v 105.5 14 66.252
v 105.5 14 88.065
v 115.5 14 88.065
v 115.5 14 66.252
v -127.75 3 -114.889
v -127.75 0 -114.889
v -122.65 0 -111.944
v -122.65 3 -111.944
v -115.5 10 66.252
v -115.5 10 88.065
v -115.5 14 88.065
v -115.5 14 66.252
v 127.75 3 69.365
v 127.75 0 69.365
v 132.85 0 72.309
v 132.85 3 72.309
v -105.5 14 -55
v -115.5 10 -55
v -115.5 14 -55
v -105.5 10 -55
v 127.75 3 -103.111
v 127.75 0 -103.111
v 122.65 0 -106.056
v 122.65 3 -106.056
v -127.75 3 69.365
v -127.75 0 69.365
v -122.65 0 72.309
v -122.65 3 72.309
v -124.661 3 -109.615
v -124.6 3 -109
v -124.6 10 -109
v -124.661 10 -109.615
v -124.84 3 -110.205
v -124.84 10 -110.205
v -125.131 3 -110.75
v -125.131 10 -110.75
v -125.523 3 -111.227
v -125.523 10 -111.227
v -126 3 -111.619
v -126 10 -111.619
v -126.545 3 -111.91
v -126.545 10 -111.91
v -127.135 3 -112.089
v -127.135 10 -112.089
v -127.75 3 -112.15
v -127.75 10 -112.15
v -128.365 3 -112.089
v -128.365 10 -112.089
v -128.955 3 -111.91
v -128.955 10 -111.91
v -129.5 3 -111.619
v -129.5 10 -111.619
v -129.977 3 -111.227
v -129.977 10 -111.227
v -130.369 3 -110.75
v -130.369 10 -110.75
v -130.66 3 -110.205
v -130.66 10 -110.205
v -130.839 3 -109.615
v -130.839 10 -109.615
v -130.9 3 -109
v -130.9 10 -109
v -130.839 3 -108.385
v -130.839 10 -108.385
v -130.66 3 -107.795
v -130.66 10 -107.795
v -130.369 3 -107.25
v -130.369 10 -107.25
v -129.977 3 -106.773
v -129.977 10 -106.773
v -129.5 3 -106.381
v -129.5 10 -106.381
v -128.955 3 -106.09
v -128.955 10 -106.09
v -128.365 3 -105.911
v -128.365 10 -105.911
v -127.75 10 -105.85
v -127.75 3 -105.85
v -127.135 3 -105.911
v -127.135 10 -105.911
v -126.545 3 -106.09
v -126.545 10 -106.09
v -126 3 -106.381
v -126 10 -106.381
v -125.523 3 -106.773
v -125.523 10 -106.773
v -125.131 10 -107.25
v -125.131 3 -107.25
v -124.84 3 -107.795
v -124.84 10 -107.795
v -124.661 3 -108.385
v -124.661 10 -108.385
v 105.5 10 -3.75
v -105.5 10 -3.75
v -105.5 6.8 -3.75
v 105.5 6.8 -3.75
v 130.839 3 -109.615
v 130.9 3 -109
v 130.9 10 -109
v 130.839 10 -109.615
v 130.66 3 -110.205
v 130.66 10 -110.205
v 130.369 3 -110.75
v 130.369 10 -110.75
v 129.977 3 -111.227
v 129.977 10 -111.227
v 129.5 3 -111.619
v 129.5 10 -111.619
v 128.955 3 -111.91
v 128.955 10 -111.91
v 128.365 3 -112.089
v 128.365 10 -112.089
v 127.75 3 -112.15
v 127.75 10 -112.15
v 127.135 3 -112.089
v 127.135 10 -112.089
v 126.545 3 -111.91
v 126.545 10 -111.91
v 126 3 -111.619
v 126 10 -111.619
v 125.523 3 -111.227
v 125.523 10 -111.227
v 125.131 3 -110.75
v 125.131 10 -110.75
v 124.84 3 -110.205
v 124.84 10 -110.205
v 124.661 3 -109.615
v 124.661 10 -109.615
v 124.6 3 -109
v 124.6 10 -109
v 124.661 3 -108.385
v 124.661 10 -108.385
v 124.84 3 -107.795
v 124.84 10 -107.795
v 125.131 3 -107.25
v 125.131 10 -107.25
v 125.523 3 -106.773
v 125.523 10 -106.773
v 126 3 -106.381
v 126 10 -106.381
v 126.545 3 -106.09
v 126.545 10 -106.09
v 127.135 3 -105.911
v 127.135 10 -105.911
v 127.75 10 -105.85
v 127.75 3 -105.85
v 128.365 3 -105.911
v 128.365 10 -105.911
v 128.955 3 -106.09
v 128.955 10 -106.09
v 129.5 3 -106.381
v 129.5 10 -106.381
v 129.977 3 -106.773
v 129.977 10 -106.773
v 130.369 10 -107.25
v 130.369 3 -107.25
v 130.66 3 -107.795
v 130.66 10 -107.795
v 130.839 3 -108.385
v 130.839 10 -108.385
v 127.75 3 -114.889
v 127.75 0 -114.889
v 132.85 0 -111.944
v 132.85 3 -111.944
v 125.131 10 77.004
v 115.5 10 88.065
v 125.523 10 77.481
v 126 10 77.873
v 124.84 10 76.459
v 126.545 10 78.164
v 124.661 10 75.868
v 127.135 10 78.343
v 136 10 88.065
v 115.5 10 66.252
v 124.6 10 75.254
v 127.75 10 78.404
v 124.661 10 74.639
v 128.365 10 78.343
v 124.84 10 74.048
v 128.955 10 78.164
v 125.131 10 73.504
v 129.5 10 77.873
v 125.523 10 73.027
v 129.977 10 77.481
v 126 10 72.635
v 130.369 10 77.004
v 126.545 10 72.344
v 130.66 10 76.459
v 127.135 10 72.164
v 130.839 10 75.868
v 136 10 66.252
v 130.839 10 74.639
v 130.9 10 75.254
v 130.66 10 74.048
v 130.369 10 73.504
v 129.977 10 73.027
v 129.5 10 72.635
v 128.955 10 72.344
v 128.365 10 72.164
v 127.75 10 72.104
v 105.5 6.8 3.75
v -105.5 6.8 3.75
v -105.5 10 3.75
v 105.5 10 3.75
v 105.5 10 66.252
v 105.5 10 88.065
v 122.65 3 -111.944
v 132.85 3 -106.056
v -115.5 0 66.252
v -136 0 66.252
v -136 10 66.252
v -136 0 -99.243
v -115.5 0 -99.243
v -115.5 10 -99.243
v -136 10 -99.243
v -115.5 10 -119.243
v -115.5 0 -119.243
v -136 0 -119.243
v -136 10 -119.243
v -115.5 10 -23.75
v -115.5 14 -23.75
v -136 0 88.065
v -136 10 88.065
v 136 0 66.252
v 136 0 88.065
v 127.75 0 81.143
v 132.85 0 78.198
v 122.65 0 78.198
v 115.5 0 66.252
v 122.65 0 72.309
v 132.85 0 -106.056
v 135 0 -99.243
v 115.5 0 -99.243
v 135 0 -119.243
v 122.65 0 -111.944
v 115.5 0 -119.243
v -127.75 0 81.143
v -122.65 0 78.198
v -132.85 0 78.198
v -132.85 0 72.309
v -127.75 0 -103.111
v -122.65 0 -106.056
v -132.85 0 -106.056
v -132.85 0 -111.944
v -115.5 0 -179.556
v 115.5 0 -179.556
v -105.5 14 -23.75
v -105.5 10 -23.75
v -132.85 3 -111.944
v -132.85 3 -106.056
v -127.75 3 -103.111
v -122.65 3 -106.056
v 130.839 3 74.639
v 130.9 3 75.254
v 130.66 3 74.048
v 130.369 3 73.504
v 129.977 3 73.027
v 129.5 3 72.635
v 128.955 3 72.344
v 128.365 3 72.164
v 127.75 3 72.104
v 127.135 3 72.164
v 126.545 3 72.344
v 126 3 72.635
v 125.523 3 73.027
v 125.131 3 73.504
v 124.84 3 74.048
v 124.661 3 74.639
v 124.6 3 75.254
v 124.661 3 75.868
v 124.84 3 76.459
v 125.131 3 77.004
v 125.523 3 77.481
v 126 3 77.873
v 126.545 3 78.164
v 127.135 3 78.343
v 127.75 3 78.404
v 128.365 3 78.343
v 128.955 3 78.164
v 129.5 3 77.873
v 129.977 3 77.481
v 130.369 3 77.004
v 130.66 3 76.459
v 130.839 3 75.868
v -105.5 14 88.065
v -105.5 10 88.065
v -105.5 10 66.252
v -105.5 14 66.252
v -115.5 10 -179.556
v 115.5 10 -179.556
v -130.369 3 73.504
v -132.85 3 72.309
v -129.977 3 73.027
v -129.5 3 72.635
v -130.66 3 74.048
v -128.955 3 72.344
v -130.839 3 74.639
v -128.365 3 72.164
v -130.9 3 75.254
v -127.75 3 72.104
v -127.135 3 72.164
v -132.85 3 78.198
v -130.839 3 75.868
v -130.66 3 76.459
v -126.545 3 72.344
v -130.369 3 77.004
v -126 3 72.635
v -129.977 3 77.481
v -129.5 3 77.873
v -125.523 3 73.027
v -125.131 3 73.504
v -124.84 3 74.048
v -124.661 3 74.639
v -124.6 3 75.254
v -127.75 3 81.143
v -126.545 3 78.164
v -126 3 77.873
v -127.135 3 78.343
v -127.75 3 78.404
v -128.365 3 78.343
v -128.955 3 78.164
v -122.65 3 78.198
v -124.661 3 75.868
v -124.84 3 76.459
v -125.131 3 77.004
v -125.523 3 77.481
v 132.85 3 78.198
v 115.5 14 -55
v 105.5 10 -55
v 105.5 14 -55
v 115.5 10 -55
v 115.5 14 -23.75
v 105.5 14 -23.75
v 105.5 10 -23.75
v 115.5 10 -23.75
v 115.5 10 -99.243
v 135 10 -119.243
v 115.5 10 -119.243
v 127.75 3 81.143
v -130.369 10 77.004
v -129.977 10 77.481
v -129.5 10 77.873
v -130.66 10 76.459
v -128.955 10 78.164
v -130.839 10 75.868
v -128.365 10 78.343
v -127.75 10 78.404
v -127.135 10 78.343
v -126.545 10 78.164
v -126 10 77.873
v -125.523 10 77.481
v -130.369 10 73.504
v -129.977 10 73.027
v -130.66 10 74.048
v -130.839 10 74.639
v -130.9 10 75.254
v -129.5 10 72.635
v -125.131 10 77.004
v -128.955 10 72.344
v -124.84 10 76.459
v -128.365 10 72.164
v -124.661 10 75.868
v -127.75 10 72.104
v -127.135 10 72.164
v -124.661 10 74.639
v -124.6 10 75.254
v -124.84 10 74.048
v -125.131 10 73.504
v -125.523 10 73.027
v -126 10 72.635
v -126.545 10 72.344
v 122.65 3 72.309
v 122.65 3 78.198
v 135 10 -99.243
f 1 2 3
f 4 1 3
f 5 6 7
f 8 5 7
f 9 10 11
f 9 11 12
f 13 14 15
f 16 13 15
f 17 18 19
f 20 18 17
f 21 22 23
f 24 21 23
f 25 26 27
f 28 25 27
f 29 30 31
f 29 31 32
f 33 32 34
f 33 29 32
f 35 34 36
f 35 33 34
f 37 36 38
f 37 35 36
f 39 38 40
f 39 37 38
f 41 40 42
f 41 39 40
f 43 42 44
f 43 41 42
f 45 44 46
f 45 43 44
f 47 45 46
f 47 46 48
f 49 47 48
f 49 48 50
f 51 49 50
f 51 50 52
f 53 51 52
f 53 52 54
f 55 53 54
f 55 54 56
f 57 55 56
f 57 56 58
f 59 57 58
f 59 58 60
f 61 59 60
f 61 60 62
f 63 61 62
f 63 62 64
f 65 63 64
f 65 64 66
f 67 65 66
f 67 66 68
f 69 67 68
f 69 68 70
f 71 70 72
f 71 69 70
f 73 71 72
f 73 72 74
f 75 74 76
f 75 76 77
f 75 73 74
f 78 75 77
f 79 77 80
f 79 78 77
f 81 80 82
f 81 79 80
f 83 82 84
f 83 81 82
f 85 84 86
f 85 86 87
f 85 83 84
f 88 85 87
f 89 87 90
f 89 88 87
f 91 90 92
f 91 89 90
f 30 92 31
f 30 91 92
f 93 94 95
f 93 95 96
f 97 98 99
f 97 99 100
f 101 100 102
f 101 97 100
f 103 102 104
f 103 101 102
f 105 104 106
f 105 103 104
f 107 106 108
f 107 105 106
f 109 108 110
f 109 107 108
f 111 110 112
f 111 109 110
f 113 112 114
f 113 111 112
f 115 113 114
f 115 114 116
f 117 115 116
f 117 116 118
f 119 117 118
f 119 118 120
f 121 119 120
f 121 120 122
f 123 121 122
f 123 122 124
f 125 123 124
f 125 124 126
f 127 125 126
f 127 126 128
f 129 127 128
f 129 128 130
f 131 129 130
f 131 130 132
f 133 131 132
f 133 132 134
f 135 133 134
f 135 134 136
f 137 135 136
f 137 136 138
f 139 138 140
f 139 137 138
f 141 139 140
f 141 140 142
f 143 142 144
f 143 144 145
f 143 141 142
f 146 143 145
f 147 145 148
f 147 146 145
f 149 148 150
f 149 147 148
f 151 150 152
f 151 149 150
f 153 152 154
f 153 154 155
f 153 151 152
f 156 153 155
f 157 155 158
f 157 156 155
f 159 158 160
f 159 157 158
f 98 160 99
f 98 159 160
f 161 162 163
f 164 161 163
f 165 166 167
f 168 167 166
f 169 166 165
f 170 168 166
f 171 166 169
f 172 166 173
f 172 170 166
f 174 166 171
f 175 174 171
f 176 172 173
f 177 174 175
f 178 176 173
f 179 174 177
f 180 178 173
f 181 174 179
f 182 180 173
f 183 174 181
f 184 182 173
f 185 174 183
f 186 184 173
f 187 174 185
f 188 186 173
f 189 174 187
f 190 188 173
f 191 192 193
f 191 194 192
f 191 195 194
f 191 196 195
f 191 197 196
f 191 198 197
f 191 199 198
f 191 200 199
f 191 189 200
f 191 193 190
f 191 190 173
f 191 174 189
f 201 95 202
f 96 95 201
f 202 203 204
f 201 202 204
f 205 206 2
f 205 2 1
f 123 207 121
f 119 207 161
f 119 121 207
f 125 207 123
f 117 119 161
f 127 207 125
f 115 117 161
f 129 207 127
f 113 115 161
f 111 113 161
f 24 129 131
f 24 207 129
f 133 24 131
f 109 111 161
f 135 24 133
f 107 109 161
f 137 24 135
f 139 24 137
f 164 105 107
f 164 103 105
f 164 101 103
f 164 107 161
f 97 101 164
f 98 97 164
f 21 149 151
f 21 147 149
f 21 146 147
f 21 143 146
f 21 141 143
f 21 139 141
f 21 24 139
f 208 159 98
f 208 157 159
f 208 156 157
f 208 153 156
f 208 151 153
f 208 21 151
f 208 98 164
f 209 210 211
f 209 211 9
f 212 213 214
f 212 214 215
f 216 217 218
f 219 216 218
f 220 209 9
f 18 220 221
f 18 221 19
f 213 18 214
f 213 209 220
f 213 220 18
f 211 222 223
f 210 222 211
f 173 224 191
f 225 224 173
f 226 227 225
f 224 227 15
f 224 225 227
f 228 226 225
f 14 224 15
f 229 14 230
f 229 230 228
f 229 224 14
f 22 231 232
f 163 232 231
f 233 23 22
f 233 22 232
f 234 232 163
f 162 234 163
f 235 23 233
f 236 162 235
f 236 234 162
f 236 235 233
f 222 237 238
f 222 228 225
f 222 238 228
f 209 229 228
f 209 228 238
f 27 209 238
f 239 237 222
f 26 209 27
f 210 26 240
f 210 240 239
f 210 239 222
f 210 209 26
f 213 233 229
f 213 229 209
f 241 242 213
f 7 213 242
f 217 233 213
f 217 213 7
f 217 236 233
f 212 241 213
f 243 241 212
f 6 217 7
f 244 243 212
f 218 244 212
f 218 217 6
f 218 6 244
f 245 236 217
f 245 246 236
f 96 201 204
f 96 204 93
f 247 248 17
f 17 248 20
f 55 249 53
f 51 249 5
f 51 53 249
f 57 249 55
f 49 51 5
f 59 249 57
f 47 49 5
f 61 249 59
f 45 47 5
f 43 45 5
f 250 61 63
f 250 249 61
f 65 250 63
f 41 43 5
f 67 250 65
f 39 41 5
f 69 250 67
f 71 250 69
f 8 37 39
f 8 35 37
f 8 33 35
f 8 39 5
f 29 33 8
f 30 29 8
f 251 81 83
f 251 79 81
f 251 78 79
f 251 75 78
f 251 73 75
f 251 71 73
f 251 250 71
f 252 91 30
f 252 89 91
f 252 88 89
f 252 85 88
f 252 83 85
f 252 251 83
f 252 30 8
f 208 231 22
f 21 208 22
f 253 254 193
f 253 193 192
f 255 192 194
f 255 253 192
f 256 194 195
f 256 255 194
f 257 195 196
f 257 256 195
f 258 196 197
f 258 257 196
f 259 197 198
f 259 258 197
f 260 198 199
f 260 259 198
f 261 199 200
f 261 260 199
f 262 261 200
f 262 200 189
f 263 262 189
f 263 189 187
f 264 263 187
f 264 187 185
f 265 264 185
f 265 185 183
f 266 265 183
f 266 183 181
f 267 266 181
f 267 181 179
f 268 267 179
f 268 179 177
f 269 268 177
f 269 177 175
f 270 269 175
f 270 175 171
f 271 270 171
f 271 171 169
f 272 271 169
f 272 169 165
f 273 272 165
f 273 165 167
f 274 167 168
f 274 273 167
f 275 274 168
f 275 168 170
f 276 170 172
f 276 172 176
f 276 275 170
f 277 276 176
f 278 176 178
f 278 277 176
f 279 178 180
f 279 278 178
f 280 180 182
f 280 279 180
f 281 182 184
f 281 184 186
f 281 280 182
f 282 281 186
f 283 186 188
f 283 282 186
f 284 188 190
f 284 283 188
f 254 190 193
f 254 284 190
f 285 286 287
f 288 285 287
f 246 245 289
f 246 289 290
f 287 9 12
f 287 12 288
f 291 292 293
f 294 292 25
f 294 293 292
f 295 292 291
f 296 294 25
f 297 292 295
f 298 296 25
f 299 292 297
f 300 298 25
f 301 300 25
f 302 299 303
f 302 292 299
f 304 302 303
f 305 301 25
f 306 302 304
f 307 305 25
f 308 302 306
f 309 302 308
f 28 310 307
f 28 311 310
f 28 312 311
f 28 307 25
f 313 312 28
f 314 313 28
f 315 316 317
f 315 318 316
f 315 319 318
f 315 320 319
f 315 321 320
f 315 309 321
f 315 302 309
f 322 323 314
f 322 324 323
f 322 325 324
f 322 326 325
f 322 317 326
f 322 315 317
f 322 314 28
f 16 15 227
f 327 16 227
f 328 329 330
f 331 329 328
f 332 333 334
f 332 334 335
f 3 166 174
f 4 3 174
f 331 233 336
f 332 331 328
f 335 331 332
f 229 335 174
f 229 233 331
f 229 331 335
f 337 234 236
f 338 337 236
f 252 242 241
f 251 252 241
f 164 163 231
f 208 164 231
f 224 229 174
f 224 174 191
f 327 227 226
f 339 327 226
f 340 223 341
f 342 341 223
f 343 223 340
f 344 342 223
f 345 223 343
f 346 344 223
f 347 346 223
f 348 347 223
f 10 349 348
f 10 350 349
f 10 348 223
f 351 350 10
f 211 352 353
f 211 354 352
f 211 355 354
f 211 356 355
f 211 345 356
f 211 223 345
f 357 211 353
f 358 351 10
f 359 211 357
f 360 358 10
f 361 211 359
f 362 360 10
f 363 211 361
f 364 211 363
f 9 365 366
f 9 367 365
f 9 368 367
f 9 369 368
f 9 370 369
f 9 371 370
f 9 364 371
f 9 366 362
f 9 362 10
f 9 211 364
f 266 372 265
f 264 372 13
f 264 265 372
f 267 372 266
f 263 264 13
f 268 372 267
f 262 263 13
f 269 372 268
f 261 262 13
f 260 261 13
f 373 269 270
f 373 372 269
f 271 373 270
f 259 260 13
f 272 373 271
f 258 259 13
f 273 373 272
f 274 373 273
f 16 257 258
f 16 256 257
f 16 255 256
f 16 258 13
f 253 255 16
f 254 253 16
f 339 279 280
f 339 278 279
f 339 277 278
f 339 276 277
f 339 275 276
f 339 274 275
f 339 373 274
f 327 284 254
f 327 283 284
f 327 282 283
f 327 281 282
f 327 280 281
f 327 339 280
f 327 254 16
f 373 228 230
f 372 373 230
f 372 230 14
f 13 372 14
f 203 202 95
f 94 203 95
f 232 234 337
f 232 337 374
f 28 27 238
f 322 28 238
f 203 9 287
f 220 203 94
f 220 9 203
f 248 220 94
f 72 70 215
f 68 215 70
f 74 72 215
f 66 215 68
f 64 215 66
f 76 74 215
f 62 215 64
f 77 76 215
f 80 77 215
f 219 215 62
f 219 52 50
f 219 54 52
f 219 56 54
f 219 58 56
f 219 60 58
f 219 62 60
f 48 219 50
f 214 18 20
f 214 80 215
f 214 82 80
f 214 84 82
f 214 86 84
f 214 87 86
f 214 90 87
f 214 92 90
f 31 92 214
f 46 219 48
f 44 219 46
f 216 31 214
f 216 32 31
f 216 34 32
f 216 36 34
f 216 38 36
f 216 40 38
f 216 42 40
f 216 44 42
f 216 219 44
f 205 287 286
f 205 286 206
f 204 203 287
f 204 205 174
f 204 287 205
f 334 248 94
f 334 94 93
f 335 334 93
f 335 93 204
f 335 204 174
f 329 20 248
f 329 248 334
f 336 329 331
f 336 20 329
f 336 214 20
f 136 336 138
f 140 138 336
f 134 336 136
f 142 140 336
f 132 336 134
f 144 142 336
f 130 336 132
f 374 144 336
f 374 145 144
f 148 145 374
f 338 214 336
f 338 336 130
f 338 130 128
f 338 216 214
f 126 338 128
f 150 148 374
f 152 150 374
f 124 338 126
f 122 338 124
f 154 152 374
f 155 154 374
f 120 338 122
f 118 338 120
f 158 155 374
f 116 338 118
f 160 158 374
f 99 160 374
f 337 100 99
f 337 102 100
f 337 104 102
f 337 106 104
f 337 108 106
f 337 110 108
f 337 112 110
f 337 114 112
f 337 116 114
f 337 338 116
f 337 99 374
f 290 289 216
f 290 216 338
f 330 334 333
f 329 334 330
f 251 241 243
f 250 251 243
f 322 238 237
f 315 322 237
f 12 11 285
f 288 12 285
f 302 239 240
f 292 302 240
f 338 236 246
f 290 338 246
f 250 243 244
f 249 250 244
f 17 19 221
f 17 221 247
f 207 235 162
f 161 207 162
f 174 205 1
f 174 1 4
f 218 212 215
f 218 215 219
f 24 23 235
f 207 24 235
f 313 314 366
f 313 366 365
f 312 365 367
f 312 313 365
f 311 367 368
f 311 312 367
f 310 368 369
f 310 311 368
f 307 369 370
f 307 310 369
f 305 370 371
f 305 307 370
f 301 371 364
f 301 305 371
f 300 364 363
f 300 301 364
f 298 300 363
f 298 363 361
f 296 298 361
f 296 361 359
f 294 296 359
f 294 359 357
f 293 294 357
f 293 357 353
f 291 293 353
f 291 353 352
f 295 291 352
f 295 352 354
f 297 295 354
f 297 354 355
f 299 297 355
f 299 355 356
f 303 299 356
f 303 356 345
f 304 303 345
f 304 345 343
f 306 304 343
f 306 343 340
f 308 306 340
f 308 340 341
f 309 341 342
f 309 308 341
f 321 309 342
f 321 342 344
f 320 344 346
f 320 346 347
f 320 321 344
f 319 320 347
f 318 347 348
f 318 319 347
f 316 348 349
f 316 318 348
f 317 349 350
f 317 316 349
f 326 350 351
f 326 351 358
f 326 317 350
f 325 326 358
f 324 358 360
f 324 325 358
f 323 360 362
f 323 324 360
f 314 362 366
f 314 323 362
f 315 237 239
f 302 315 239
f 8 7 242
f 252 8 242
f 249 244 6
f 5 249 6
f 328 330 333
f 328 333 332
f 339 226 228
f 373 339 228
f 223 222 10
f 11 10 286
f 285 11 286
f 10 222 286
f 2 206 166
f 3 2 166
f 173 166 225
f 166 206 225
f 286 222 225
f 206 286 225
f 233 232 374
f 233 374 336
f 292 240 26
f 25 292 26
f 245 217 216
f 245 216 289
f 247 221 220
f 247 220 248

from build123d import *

# Parameters (mm, degrees)
SKETCH1_W           = 211
SKETCH1_H           = 110
BOSS_EXTRUDE1_DEPTH = 10
SKETCH1_3_W         = 10
SKETCH1_3_H         = 110
BOSS_EXTRUDE2_DEPTH = 14
SKETCH5_W           = 211
SKETCH5_H           = 7.5
CUT_EXTRUDE5_DEPTH  = 3.2
SKETCH6_R           = 3.15
BOSS_EXTRUDE3_DEPTH = 10
CUT_EXTRUDE9_DEPTH  = 2
SKETCH11_W          = 10
SKETCH11_H          = 21.813163886
BOSS_EXTRUDE5_DEPTH = 4
SKETCH12_W          = 10
SKETCH12_H          = 78.75
CUT_EXTRUDE10_DEPTH = 4
CUT_EXTRUDE7_DEPTH  = 3
SKETCH13_W          = 231
SKETCH13_H          = 60.312496228
BOSS_EXTRUDE6_DEPTH = 10


with BuildPart() as part:
    # Sketch1 → Boss-Extrude1 (new body)
    with BuildSketch(Plane(origin=(0, 0, 0), x_dir=(1, 0, 0), z_dir=(0, 1, 0))):
        Rectangle(SKETCH1_W, SKETCH1_H)
    extrude(amount=BOSS_EXTRUDE1_DEPTH)

    # Sketch1<3> → Boss-Extrude2 (add)
    with BuildSketch(Plane(origin=(0, 0, 0), x_dir=(1, 0, 0), z_dir=(0, 1, 0))):
        with Locations((-110.5, 0)):
            Rectangle(SKETCH1_3_W, SKETCH1_3_H)
        with Locations((110.5, 0)):
            Rectangle(SKETCH1_3_W, SKETCH1_3_H)
    extrude(amount=BOSS_EXTRUDE2_DEPTH)

    # Sketch5 → Cut-Extrude5 (cut)
    with BuildSketch(Plane(origin=(0, 10, 0), x_dir=(1, 0, 0), z_dir=(0, 1, 0))):
        Rectangle(SKETCH5_W, SKETCH5_H)
    extrude(amount=-CUT_EXTRUDE5_DEPTH, mode=Mode.SUBTRACT)

    # Sketch6 → Boss-Extrude3 (add)
    # profile 1 of 2: a face of its own
    with BuildSketch(Plane(origin=(0, 0, 0), x_dir=(1, 0, 0), z_dir=(0, 1, 0))):
        Polygon((-136, 119.243156134), (-106.5, 119.243156134), (104.5, 119.243156134), (135, 119.243156134), (135, 99.243156134), (115.5, 99.243156134), (115.5, 55), (-115.5, 55), (-115.5, 99.243156134), (-136, 99.243156134), align=None)
        with Locations((-127.75, 109)):
            Circle(SKETCH6_R, mode=Mode.SUBTRACT)
        with Locations((127.75, 109)):
            Circle(SKETCH6_R, mode=Mode.SUBTRACT)
    # profile 2 of 2: a face of its own
    with BuildSketch(Plane(origin=(0, 0, 0), x_dir=(1, 0, 0), z_dir=(0, 1, 0))):
        Polygon((-136, -66.252271661), (-115.5, -66.252271661), (-115.5, -55), (-104.100072783, -55), (104.5, -55), (115.5, -55), (115.5, -66.252271661), (136, -66.252271661), (136, -88.065435547), (-136, -88.065435547), align=None)
        with Locations((-127.75, -75.253909377)):
            Circle(SKETCH6_R, mode=Mode.SUBTRACT)
        with Locations((127.75, -75.253909377)):
            Circle(SKETCH6_R, mode=Mode.SUBTRACT)
    extrude(amount=BOSS_EXTRUDE3_DEPTH)

    # Sketch7<2> → Cut-Extrude9 (cut)
    with BuildSketch(Plane.XZ):
        Polygon((-127.75, 69.364936631), (-122.65, 72.309423004), (-122.65, 78.19839575), (-127.75, 81.142882123), (-132.85, 78.19839575), (-132.85, 72.309423004), align=None)
        Polygon((127.75, 69.364936631), (132.85, 72.309423004), (132.85, 78.19839575), (127.75, 81.142882123), (122.65, 78.19839575), (122.65, 72.309423004), align=None)
        Polygon((-127.75, -114.888972746), (-122.65, -111.944486373), (-122.65, -106.055513627), (-127.75, -103.111027254), (-132.85, -106.055513627), (-132.85, -111.944486373), align=None)
        Polygon((127.75, -114.888972746), (132.85, -111.944486373), (132.85, -106.055513627), (127.75, -103.111027254), (122.65, -106.055513627), (122.65, -111.944486373), align=None)
    extrude(amount=-CUT_EXTRUDE9_DEPTH, mode=Mode.SUBTRACT)

    # Sketch11 → Boss-Extrude5 (add)
    with BuildSketch(Plane(origin=(0, 10, 0), x_dir=(1, 0, 0), z_dir=(0, 1, 0))):
        with Locations((-110.5, -77.158853604)):
            Rectangle(SKETCH11_W, SKETCH11_H)
        with Locations((110.5, -77.158853604)):
            Rectangle(SKETCH11_W, SKETCH11_H)
    extrude(amount=BOSS_EXTRUDE5_DEPTH)

    # Sketch12 → Cut-Extrude10 (cut)
    with BuildSketch(Plane(origin=(0, 14, 0), x_dir=(1, 0, 0), z_dir=(0, 1, 0))):
        with Locations((-110.5, -15.625)):
            Rectangle(SKETCH12_W, SKETCH12_H)
        with Locations((110.5, -15.625)):
            Rectangle(SKETCH12_W, SKETCH12_H)
    extrude(amount=-CUT_EXTRUDE10_DEPTH, mode=Mode.SUBTRACT)

    # Sketch7 → Cut-Extrude7 (cut)
    with BuildSketch(Plane.XZ):
        Polygon((-127.75, 69.364936631), (-122.65, 72.309423004), (-122.65, 78.19839575), (-127.75, 81.142882123), (-132.85, 78.19839575), (-132.85, 72.309423004), align=None)
        Polygon((127.75, 69.364936631), (132.85, 72.309423004), (132.85, 78.19839575), (127.75, 81.142882123), (122.65, 78.19839575), (122.65, 72.309423004), align=None)
        Polygon((-127.75, -114.888972746), (-122.65, -111.944486373), (-122.65, -106.055513627), (-127.75, -103.111027254), (-132.85, -106.055513627), (-132.85, -111.944486373), align=None)
        Polygon((127.75, -114.888972746), (132.85, -111.944486373), (132.85, -106.055513627), (127.75, -103.111027254), (122.65, -106.055513627), (122.65, -111.944486373), align=None)
    extrude(amount=-CUT_EXTRUDE7_DEPTH, mode=Mode.SUBTRACT)

    # Sketch13 → Boss-Extrude6 (add)
    with BuildSketch(Plane(origin=(0, 0, 0), x_dir=(1, 0, 0), z_dir=(0, 1, 0))):
        with Locations((0, 149.399404248)):
            Rectangle(SKETCH13_W, SKETCH13_H)
    extrude(amount=BOSS_EXTRUDE6_DEPTH)


solid = part.part
